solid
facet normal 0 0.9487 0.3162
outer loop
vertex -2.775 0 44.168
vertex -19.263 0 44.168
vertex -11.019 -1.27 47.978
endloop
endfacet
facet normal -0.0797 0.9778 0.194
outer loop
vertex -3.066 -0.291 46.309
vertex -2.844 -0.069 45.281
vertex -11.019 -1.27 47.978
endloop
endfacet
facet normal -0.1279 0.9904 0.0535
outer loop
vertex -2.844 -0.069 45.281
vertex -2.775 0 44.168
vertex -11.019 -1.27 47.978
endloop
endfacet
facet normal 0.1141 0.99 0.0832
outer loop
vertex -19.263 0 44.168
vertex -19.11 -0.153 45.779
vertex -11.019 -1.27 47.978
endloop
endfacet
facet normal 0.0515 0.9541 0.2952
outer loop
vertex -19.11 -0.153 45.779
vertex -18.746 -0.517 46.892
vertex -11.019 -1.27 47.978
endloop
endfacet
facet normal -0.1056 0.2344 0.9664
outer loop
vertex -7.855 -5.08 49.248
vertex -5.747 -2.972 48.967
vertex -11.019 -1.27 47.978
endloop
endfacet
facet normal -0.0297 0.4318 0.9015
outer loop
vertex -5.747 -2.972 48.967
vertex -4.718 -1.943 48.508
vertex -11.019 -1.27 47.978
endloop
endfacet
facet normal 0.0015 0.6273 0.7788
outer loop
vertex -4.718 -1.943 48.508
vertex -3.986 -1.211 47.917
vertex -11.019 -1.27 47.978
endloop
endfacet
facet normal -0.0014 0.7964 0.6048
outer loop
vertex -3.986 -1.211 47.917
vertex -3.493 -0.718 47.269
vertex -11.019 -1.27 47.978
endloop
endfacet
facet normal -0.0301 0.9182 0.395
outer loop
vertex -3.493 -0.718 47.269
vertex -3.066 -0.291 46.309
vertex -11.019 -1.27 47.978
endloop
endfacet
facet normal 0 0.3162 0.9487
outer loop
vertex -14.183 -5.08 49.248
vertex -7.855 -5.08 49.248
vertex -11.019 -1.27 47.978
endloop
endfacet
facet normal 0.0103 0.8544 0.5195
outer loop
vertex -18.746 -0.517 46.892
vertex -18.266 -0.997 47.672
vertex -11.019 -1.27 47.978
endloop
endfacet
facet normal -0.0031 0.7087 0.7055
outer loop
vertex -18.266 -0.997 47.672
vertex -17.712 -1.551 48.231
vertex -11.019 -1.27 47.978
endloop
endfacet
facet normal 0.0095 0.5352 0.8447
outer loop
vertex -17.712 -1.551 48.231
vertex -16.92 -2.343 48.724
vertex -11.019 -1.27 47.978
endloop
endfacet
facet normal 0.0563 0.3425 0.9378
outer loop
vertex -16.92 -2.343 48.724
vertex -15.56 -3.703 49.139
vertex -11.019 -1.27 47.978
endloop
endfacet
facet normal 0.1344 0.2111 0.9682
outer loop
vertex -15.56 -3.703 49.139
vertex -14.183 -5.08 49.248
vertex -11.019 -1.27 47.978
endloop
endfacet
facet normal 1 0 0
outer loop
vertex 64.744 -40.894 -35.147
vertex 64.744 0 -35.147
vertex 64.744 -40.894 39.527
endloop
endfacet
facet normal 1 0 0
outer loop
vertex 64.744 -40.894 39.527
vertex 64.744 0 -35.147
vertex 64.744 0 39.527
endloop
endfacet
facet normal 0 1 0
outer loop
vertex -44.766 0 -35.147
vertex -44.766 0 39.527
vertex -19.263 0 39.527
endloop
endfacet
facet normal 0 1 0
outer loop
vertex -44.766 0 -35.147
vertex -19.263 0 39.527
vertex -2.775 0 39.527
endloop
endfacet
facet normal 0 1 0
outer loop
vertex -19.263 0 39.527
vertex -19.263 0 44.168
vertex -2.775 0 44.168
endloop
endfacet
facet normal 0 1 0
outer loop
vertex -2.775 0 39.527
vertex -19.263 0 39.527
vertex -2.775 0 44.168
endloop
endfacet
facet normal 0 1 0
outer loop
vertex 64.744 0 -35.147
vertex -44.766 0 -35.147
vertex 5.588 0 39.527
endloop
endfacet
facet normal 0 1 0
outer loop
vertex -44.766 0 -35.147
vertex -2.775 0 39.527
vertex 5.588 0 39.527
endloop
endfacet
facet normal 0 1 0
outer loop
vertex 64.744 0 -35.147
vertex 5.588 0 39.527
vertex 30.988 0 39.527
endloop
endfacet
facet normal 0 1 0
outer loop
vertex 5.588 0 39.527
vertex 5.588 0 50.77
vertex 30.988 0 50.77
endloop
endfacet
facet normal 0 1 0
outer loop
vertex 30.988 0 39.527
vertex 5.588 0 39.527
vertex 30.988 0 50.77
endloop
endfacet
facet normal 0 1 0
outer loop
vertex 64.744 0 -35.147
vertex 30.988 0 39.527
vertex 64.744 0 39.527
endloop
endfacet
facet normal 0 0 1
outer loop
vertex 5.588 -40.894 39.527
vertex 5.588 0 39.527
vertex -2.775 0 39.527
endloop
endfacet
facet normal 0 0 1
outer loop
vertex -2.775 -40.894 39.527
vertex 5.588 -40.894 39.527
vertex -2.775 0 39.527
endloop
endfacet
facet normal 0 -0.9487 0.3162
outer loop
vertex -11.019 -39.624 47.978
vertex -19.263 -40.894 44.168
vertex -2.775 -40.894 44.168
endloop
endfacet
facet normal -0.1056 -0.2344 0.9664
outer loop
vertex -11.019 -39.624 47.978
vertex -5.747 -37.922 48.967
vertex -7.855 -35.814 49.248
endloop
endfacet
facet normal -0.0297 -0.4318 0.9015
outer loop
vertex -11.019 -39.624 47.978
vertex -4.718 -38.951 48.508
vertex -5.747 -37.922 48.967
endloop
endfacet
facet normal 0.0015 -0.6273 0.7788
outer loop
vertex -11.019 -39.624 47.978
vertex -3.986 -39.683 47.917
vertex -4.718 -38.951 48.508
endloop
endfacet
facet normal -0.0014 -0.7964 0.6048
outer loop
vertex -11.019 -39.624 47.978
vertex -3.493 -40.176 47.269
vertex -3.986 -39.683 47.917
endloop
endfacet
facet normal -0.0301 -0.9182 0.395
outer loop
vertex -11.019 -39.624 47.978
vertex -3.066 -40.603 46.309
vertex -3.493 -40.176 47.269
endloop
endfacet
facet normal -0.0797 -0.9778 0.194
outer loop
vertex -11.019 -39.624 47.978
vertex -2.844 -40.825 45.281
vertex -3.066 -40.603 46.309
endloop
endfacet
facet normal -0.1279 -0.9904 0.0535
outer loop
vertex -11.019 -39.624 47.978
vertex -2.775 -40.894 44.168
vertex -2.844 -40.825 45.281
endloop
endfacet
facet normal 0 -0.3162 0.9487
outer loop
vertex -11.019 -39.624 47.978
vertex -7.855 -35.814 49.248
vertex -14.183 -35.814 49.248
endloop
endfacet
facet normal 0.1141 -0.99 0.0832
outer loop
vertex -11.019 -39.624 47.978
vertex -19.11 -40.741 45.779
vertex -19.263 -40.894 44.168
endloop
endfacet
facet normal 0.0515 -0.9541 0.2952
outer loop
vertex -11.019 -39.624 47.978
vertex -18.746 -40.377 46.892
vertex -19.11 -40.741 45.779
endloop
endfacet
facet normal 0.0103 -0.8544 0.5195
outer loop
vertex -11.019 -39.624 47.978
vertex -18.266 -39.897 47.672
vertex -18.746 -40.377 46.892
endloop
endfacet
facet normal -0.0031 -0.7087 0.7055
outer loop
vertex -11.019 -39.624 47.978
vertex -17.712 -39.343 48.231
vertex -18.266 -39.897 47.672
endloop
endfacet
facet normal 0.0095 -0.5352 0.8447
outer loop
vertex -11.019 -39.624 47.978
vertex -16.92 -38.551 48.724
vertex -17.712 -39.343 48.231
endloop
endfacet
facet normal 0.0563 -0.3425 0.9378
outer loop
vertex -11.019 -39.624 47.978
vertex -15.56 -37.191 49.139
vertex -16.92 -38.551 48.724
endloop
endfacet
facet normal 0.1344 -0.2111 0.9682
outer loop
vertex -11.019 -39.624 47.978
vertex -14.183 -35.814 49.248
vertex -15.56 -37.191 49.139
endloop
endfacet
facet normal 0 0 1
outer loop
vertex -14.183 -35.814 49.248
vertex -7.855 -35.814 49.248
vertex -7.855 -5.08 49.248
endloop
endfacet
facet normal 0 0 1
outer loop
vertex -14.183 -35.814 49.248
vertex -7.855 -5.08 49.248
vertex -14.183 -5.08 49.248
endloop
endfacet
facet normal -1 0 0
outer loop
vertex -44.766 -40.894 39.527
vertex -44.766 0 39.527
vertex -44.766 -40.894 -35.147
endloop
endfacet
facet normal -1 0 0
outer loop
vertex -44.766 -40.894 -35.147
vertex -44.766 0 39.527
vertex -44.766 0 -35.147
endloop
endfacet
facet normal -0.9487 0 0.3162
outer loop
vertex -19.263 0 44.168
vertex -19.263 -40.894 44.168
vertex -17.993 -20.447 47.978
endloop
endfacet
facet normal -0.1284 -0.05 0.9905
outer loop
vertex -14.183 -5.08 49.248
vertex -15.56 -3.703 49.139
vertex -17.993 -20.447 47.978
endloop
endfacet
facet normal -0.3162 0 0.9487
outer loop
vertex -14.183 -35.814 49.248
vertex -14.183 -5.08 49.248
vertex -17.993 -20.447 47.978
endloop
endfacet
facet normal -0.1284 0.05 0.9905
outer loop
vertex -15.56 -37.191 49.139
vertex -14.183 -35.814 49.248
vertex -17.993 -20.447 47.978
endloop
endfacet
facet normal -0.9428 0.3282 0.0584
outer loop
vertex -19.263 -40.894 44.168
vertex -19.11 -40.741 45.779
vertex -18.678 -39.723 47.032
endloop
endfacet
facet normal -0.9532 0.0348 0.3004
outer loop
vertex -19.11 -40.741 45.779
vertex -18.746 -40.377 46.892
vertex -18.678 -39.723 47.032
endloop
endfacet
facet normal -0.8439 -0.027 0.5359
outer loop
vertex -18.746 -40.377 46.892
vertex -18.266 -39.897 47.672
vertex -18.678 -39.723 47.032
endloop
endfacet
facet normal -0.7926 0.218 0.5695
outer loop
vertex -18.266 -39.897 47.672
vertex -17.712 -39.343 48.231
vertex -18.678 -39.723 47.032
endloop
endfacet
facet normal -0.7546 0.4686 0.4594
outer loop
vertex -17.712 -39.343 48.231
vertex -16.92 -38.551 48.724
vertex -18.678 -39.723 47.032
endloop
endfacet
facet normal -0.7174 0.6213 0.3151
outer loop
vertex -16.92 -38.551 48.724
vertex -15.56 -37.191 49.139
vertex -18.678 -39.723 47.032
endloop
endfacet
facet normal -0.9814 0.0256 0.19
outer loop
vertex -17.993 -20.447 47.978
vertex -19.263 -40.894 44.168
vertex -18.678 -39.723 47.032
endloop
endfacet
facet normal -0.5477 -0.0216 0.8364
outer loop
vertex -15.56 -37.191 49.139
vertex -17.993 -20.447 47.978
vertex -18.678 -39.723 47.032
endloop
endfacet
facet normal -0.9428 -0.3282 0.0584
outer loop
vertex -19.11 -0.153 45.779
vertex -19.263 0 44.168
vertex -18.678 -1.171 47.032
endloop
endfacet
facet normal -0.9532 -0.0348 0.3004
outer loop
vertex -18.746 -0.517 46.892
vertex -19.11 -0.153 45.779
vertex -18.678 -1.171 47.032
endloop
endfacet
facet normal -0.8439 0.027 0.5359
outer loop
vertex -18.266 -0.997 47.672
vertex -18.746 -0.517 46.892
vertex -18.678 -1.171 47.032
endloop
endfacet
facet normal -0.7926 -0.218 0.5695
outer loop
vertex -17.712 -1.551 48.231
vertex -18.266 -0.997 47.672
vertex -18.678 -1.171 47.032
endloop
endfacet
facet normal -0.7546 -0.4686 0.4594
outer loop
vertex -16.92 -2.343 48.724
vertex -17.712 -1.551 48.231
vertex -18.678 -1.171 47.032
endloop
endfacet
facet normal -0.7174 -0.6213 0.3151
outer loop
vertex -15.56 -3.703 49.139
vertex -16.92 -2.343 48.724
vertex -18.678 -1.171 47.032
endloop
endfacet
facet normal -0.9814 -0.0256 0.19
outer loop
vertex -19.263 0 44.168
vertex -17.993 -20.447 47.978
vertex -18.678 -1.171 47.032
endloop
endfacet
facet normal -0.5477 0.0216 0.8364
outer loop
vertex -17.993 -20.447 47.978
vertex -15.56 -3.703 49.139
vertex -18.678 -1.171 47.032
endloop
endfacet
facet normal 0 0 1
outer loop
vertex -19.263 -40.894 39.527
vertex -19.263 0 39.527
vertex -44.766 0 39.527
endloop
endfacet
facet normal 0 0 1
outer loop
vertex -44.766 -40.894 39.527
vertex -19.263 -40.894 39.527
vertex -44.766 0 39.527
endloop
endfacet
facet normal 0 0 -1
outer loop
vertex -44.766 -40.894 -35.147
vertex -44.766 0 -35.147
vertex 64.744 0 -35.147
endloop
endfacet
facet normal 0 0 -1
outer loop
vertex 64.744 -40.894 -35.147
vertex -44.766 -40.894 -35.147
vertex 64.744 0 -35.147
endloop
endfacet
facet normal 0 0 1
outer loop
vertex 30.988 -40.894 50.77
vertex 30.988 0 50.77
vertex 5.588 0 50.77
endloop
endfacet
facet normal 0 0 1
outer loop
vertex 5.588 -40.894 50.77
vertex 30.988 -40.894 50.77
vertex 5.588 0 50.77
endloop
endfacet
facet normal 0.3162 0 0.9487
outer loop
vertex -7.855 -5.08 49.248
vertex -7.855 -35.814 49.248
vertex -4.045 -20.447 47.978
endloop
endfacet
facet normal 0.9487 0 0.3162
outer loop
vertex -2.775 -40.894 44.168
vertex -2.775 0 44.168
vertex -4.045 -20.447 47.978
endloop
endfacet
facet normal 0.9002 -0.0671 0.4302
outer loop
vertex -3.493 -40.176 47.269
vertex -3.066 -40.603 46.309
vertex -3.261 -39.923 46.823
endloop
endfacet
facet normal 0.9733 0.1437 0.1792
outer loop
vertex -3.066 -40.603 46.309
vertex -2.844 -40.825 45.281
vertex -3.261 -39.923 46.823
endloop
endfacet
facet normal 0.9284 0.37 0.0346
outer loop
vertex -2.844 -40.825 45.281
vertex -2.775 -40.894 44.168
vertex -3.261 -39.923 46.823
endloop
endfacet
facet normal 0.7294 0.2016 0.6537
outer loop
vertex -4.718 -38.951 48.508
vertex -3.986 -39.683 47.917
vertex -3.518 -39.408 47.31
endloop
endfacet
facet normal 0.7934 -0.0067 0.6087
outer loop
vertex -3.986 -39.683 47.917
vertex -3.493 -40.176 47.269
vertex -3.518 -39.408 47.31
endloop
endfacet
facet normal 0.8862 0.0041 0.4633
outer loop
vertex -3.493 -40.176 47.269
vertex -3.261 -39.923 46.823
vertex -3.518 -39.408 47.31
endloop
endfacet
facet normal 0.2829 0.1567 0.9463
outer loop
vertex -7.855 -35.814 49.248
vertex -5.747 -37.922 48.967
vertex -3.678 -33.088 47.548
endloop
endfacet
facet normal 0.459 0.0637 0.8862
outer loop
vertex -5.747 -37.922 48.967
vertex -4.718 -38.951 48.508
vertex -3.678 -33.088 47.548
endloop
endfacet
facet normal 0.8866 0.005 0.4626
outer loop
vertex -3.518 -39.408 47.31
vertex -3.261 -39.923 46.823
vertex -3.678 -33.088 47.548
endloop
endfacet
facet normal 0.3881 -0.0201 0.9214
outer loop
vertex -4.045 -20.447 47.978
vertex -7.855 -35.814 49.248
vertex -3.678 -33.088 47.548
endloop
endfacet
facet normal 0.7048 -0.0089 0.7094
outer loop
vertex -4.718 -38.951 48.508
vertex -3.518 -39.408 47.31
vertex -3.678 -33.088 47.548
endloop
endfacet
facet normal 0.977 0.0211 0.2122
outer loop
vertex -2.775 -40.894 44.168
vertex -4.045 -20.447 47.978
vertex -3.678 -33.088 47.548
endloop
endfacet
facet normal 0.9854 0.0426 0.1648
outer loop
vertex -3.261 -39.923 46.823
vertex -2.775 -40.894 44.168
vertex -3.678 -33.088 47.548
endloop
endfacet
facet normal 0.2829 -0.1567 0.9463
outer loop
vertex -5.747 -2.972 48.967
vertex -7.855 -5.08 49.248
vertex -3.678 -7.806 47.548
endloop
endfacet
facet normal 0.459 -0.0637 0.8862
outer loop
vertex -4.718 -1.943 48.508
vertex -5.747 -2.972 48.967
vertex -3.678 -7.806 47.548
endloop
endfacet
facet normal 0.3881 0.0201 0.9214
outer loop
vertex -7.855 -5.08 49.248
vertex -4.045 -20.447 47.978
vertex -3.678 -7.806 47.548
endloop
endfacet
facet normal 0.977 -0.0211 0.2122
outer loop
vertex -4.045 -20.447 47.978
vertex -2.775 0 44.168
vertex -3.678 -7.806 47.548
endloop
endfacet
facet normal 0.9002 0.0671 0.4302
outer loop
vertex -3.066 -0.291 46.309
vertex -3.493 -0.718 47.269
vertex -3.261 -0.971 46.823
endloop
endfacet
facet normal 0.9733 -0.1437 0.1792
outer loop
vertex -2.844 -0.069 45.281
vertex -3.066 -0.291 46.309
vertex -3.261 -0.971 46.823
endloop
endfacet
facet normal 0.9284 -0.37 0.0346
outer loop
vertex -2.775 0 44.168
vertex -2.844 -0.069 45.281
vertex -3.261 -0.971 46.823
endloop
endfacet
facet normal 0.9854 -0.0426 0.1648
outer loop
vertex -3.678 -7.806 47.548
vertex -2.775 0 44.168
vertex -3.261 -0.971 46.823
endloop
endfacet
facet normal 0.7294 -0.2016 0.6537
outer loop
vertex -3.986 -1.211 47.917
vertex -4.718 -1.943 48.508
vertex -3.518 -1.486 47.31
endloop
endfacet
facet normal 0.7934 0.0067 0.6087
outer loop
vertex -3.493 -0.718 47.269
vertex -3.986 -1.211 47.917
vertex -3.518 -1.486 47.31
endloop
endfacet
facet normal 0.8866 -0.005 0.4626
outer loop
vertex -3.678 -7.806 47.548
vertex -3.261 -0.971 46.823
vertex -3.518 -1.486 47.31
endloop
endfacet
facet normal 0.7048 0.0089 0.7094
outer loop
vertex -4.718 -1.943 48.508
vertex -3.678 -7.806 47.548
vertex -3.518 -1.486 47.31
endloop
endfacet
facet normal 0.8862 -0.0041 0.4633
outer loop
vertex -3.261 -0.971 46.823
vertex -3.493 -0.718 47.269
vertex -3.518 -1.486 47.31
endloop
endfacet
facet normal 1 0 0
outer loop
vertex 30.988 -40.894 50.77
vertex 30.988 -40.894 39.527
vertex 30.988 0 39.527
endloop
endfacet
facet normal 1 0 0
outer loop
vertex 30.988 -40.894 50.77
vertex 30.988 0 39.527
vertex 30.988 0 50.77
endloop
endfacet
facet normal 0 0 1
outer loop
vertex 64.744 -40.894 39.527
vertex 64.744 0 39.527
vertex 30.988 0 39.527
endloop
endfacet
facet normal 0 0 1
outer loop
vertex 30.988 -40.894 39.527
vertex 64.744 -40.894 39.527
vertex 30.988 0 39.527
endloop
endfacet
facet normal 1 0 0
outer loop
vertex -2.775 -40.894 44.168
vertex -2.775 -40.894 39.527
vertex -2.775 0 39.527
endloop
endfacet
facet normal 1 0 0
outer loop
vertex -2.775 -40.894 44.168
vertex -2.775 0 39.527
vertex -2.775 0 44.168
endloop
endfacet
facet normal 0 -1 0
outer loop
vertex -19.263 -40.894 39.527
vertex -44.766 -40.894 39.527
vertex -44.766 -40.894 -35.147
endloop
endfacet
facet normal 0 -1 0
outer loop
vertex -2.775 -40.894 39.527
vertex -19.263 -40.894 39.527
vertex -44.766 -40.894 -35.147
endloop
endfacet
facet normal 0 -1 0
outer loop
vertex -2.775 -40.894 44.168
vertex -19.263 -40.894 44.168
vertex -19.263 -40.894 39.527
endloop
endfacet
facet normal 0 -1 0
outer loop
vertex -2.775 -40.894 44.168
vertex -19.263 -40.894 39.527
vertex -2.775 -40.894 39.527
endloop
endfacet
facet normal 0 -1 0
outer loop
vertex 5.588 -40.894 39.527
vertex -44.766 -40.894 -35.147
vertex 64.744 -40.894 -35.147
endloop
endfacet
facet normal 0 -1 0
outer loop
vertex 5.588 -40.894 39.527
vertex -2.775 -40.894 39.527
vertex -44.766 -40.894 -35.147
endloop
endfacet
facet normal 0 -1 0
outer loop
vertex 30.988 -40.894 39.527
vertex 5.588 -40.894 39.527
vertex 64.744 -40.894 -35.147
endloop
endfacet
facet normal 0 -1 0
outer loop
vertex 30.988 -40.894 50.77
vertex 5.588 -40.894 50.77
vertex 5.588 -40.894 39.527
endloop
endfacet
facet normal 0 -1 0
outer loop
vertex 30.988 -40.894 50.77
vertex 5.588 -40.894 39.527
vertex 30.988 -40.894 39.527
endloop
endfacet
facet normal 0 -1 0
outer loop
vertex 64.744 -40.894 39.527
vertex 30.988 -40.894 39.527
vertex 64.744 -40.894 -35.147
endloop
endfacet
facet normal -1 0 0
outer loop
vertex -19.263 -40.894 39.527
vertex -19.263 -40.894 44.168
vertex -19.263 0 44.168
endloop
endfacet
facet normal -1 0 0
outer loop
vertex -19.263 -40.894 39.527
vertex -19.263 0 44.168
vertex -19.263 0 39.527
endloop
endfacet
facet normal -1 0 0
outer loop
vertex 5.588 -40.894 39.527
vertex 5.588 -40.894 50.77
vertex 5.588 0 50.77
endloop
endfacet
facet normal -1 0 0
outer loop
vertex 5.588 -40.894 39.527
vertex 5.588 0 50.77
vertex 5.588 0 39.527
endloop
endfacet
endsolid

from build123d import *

# Parameters (mm, degrees)
F1_DEPTH     = 40.894
F2_T1_DEPTH  = 66.294
F2_T6_DEPTH  = 41.888453839
F2_T11_DEPTH = 41.888453839


# Not quite as in the source:
# - a fillet or chamfer that OpenCascade refuses, or shapes differently, is made with other operations: its cross-section is extruded or revolved along the edge and cut away or added


with BuildPart() as f1:
    # F0 (on Front) → F1 (new body)
    with BuildSketch(Plane.XZ):
        Polygon((-44.7658635676, 39.5274721086), (-44.7658635676, -35.146754235), (64.7440105677, -35.146754235), (64.7440105677, 39.5274721086), (30.9880006403, 39.5274721086), (30.9880006403, 50.7696404397), (5.5880006403, 50.7696404397), (5.5880006403, 39.5274721086), (-2.774850931, 39.5274721086), (-2.774850931, 49.2475219071), (-19.26330477, 49.2475219071), (-19.26330477, 39.5274721086), align=None)
    extrude(amount=F1_DEPTH)

    # F2: fillet of radius 5.08 on 4 edges, made by hand

    # F2_s2 → F2_t1 (cut)
    with BuildSketch(Plane.XZ.offset(-12.7)):
        with BuildLine():
            add(Edge.make_bspline(
                [(-2.774850931, 44.1675219071), (-2.774850931, 49.2475219071), (-7.854850931, 49.2475219071)],
                knots=[0, 0, 0, 1, 1, 1], degree=2, weights=[1, 1, 1]))
            Line((-7.854850931, 49.2475219071), (-2.774850931, 49.2475219071))
            Line((-2.774850931, 49.2475219071), (-2.774850931, 44.1675219071))
        make_face()
        with BuildLine():
            add(Edge.make_bspline(
                [(-14.18330477, 49.2475219071), (-19.26330477, 49.2475219071), (-19.26330477, 44.1675219071)],
                knots=[0, 0, 0, 1, 1, 1], degree=2, weights=[1, 1, 1]))
            Line((-19.26330477, 44.1675219071), (-19.26330477, 49.2475219071))
            Line((-19.26330477, 49.2475219071), (-14.18330477, 49.2475219071))
        make_face()
    extrude(amount=F2_T1_DEPTH, mode=Mode.SUBTRACT)


with BuildPart() as f2_tool4:
    # F2_s5 → F2_t6 (new body)
    with BuildSketch(Plane.YZ.offset(9.925149069)):
        with BuildLine():
            add(Edge.make_bspline(
                [(-5.08, 49.2475219071), (0, 49.2475219071), (0, 44.1675219071)],
                knots=[0, 0, 0, 1, 1, 1], degree=2, weights=[1, 1, 1]))
            Line((0, 44.1675219071), (0, 49.2475219071))
            Line((0, 49.2475219071), (-5.08, 49.2475219071))
        make_face()
    extrude(amount=-F2_T6_DEPTH)

    split(bisect_by=Plane.YZ.offset(5.5880006403), keep=Keep.BOTTOM)


with BuildPart() as f1_1:
    add(f1.part)

    # F2_t3: cut F2_tool4
    add(f2_tool4.part, mode=Mode.SUBTRACT)


with BuildPart() as f2_tool9:
    # F2_s10 → F2_t11 (new body)
    with BuildSketch(Plane.YZ.offset(9.925149069)):
        with BuildLine():
            add(Edge.make_bspline(
                [(-35.814, 49.2475219071), (-40.894, 49.2475219071), (-40.894, 44.1675219071)],
                knots=[0, 0, 0, 1, 1, 1], degree=2, weights=[1, 1, 1]))
            Line((-40.894, 44.1675219071), (-40.894, 49.2475219071))
            Line((-40.894, 49.2475219071), (-35.814, 49.2475219071))
        make_face()
    extrude(amount=-F2_T11_DEPTH)

    split(bisect_by=Plane.YZ.offset(5.5880006403), keep=Keep.BOTTOM)


with BuildPart() as f1_2:
    add(f1_1.part)

    # F2_t8: cut F2_tool9
    add(f2_tool9.part, mode=Mode.SUBTRACT)


solid = f1_2.part
